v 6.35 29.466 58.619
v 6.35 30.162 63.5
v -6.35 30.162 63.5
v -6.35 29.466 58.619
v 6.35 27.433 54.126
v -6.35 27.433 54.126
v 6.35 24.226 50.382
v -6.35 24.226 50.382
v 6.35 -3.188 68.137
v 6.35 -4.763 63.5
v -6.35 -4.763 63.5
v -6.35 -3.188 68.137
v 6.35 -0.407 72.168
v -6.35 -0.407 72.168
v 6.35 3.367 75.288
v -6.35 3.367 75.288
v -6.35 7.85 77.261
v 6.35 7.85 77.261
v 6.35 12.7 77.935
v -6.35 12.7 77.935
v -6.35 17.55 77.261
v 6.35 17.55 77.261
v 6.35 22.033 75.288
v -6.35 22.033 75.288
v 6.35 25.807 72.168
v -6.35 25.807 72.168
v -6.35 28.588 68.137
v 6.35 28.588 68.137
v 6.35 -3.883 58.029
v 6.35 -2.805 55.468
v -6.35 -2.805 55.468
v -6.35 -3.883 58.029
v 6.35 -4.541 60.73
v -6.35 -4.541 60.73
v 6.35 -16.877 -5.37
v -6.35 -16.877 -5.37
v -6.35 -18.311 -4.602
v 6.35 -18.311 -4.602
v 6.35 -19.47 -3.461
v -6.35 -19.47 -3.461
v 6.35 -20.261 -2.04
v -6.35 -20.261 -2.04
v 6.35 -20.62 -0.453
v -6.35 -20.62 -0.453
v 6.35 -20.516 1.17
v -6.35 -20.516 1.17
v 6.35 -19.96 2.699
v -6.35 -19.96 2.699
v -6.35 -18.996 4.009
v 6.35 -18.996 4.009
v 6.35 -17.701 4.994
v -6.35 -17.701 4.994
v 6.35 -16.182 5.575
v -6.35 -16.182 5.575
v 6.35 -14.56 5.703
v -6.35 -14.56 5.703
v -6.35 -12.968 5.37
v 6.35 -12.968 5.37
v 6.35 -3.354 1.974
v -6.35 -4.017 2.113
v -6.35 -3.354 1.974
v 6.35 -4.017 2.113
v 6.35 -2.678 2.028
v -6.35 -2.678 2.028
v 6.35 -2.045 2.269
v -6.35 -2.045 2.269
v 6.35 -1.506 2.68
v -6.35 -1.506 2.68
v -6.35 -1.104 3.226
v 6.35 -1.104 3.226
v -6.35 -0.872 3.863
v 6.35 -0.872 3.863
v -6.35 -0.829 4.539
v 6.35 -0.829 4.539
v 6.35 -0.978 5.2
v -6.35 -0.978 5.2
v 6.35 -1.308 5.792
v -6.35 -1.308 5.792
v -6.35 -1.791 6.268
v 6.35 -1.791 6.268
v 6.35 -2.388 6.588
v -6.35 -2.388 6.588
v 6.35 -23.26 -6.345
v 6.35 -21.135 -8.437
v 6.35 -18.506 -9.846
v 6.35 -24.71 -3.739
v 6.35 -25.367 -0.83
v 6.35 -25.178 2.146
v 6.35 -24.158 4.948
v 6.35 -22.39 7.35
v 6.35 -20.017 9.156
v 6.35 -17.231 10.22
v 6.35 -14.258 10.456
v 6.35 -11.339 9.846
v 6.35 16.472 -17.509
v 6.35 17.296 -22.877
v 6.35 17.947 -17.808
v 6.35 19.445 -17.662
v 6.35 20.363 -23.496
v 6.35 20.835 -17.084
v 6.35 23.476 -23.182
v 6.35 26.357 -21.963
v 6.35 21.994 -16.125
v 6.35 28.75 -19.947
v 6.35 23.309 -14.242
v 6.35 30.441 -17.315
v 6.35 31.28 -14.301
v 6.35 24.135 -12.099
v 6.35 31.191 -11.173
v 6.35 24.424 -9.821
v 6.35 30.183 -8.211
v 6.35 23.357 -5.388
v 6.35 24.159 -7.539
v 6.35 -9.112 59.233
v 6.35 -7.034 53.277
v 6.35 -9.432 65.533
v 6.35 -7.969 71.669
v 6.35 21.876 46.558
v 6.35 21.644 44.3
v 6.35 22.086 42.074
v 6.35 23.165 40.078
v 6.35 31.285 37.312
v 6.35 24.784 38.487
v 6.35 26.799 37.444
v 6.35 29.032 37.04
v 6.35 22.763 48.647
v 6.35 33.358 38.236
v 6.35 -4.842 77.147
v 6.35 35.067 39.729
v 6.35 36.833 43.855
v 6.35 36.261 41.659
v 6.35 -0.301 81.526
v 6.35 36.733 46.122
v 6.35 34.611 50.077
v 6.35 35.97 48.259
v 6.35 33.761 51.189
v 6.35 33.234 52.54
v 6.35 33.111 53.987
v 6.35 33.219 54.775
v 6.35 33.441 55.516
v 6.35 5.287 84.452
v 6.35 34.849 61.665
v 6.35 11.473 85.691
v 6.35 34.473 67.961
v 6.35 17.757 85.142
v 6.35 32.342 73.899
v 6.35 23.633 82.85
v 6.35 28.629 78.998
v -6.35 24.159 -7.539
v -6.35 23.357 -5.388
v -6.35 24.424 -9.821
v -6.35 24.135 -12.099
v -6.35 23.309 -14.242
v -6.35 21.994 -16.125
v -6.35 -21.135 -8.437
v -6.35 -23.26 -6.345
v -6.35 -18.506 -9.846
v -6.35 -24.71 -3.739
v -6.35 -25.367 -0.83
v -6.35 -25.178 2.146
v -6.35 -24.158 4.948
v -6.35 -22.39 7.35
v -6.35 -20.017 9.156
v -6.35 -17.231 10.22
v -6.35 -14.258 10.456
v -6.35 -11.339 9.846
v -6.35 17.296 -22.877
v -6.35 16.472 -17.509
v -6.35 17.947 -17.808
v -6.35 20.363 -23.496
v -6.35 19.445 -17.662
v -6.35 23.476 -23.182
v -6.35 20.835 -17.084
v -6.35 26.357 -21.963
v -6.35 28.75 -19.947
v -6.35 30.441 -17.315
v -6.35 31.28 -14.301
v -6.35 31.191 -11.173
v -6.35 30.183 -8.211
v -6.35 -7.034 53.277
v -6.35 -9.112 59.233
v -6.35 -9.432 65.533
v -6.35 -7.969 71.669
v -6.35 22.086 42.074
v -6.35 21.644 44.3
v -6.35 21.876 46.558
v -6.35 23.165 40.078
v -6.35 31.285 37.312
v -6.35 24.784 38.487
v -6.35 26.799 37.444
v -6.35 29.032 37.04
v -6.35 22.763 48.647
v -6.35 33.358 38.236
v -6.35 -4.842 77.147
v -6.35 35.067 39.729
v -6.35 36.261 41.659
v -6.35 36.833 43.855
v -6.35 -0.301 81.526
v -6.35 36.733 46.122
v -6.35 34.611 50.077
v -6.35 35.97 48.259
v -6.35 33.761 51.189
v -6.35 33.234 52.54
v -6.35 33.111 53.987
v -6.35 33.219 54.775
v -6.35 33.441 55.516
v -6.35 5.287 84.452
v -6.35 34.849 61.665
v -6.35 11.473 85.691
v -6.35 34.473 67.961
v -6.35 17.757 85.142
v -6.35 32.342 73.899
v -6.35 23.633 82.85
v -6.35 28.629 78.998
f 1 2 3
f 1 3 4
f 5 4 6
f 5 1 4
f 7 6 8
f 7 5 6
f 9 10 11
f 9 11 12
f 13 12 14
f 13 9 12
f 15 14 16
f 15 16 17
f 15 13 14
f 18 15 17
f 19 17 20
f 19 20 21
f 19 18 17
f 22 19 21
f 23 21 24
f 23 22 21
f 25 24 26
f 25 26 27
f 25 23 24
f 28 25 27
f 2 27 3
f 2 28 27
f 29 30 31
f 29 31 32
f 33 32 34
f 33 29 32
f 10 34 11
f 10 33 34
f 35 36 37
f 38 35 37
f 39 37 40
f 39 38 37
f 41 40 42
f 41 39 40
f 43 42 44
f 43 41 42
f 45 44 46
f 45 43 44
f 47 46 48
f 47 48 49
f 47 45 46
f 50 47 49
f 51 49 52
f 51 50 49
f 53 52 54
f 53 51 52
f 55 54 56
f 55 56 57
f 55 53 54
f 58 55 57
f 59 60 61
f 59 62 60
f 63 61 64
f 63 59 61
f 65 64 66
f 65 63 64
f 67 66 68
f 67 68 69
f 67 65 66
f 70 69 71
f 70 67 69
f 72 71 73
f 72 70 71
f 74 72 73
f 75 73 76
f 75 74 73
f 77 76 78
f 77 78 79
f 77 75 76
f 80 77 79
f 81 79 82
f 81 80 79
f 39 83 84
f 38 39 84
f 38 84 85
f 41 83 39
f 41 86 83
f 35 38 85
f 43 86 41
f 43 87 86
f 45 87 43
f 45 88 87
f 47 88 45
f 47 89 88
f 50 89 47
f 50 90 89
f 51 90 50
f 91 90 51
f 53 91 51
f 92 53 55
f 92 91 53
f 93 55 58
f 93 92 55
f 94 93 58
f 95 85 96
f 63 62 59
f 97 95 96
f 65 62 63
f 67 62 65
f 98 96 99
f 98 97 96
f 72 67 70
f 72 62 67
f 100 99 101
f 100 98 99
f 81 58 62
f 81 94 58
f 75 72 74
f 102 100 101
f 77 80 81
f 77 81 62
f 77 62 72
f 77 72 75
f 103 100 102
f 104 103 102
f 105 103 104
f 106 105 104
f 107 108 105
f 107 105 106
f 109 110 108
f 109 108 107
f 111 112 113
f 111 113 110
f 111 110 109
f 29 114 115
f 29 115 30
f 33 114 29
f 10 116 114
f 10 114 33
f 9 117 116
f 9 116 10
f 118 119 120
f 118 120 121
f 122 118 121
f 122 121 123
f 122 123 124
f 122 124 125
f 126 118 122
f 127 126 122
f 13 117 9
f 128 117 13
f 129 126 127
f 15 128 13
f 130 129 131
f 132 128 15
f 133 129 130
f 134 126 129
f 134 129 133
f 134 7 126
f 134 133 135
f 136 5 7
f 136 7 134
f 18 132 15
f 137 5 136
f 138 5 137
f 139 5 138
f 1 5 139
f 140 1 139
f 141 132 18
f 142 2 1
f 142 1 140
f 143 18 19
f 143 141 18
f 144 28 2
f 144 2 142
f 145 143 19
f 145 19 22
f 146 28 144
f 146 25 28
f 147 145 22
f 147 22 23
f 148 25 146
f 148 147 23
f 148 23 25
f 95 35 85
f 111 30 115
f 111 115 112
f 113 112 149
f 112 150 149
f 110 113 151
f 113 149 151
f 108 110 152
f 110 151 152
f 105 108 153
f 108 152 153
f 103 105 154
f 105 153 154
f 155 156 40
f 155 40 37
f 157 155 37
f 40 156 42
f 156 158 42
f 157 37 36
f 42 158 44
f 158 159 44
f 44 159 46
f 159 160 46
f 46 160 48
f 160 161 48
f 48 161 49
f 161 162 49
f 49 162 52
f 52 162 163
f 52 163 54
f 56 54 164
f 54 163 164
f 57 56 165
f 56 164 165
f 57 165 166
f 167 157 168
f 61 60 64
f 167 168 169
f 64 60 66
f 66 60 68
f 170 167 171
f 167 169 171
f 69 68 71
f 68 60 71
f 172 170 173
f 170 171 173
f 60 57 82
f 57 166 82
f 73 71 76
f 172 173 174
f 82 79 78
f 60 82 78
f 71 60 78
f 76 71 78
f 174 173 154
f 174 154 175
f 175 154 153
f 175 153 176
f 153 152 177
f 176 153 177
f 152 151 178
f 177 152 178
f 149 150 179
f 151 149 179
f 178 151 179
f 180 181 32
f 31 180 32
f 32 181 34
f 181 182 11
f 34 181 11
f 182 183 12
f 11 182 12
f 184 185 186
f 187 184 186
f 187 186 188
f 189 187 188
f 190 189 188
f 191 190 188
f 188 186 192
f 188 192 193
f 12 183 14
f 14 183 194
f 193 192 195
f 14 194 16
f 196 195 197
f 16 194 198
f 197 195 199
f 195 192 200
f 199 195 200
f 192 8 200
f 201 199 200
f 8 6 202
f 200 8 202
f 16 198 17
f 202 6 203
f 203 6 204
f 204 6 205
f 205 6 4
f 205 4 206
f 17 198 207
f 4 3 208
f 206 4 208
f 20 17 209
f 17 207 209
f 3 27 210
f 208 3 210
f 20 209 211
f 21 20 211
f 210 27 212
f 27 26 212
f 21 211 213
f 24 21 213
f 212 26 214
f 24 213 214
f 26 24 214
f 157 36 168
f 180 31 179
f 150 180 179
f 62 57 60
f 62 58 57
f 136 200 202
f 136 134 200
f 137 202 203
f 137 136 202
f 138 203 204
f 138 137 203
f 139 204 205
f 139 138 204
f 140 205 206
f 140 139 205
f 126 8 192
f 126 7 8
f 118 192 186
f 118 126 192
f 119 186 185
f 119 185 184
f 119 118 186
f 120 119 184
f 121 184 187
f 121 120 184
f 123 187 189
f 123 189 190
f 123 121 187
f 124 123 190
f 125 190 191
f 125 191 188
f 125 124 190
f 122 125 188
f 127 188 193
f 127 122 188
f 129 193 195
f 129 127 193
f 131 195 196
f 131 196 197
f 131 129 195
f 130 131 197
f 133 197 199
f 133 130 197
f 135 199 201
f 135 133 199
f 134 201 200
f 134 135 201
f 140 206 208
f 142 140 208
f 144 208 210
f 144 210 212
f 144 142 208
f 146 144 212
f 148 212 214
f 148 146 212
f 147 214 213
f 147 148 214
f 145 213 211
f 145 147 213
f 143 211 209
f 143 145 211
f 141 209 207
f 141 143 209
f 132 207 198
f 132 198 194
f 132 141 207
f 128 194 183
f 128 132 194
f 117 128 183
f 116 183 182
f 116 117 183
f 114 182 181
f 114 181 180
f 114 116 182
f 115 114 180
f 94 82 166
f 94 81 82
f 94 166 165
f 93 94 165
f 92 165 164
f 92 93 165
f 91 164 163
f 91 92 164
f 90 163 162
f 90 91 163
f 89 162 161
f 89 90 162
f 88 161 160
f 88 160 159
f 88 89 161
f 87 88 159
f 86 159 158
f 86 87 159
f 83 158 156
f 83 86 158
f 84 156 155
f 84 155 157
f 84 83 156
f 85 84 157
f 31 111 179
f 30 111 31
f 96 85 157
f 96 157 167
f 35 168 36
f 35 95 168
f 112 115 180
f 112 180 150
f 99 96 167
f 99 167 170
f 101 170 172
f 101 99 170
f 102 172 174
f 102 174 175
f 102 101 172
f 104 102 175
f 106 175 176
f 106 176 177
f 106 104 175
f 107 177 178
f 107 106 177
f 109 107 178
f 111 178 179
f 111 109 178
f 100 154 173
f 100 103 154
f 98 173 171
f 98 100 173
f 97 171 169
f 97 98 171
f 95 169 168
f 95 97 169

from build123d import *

# Parameters (mm, degrees)
F1_DEPTH = 6.35
F3_DEPTH = 6.35
F4_R     = 5.08
F5_R     = 5.08


with BuildPart() as f1:
    # F0 (on Right) → F1 (new body, symmetric)
    with BuildSketch(Plane.YZ):
        with BuildLine():
            Line((-2.3884117353, 6.5878875691), (-11.3389839483, 9.8456294343))
            ThreePointArc((-11.3389839483, 9.8456294343), (-24.7681294343, 3.5835160517), (-18.5060160517, -9.8456294343))
            Line((-18.5060160517, -9.8456294343), (17.2962728002, -22.876596895))
            ThreePointArc((17.2962728002, -22.876596895), (28.7503201953, -19.9470893959), (30.1830436792, -8.2114803647))
            Line((30.1830436792, -8.2114803647), (-2.8054247121, 55.4675215066))
            ThreePointArc((-2.8054247121, 55.4675215066), (15.9289301948, 80.6613786173), (24.2258585116, 50.3815590934))
            ThreePointArc((24.2258585116, 50.3815590934), (30.7726917058, 37.1897530277), (31.6517846048, 51.8905002135))
            ThreePointArc((31.6517846048, 51.8905002135), (13.495941442, 85.7107429462), (-7.0341769063, 53.2768455539))
            Line((-7.0341769063, 53.2768455539), (25.954291485, -10.4021563174))
            ThreePointArc((25.954291485, -10.4021563174), (25.1728059483, -16.8033976072), (18.9251437328, -18.4013107885))
            Line((18.9251437328, -18.4013107885), (-16.8771451191, -5.3703433278))
            ThreePointArc((-16.8771451191, -5.3703433278), (-20.2928433278, 1.9546451191), (-12.9678548809, 5.3703433278))
            Line((-12.9678548809, 5.3703433278), (-4.0172826679, 2.1126014626))
            ThreePointArc((-4.0172826679, 2.1126014626), (-0.9652041484, 3.5358090496), (-2.3884117353, 6.5878875691))
        make_face()
    extrude(amount=F1_DEPTH, both=True)

    # F2 (on Right) → F3 (join, symmetric)
    with BuildSketch(Plane.YZ):
        with BuildLine():
            Line((25.954291485, -10.4021563174), (23.3565733209, -5.3876737451))
            ThreePointArc((23.3565733209, -5.3876737451), (23.915643926, -12.8393677138), (18.9251437328, -18.4013107885))
            ThreePointArc((18.9251437328, -18.4013107885), (25.1728059483, -16.8033976072), (25.954291485, -10.4021563174))
        make_face()
        with BuildLine():
            ThreePointArc((30.1625, 63.5), (12.7, 80.9625), (-4.7625, 63.5))
            ThreePointArc((-4.7625, 63.5), (12.7, 77.9349299335), (30.1625, 63.5))
        make_face()
    extrude(amount=F3_DEPTH, both=True)

    # F4
    f4_edges = [f1.edges().sort_by_distance(p)[0] for p in [
        (0, 31.651785, 51.8905),
    ]]
    fillet(f4_edges, radius=F4_R)

    # F5
    f5_edges = [f1.edges().sort_by_distance(p)[0] for p in [
        (0, 18.925144, -18.401311),
    ]]
    fillet(f5_edges, radius=F5_R)


solid = f1.part
